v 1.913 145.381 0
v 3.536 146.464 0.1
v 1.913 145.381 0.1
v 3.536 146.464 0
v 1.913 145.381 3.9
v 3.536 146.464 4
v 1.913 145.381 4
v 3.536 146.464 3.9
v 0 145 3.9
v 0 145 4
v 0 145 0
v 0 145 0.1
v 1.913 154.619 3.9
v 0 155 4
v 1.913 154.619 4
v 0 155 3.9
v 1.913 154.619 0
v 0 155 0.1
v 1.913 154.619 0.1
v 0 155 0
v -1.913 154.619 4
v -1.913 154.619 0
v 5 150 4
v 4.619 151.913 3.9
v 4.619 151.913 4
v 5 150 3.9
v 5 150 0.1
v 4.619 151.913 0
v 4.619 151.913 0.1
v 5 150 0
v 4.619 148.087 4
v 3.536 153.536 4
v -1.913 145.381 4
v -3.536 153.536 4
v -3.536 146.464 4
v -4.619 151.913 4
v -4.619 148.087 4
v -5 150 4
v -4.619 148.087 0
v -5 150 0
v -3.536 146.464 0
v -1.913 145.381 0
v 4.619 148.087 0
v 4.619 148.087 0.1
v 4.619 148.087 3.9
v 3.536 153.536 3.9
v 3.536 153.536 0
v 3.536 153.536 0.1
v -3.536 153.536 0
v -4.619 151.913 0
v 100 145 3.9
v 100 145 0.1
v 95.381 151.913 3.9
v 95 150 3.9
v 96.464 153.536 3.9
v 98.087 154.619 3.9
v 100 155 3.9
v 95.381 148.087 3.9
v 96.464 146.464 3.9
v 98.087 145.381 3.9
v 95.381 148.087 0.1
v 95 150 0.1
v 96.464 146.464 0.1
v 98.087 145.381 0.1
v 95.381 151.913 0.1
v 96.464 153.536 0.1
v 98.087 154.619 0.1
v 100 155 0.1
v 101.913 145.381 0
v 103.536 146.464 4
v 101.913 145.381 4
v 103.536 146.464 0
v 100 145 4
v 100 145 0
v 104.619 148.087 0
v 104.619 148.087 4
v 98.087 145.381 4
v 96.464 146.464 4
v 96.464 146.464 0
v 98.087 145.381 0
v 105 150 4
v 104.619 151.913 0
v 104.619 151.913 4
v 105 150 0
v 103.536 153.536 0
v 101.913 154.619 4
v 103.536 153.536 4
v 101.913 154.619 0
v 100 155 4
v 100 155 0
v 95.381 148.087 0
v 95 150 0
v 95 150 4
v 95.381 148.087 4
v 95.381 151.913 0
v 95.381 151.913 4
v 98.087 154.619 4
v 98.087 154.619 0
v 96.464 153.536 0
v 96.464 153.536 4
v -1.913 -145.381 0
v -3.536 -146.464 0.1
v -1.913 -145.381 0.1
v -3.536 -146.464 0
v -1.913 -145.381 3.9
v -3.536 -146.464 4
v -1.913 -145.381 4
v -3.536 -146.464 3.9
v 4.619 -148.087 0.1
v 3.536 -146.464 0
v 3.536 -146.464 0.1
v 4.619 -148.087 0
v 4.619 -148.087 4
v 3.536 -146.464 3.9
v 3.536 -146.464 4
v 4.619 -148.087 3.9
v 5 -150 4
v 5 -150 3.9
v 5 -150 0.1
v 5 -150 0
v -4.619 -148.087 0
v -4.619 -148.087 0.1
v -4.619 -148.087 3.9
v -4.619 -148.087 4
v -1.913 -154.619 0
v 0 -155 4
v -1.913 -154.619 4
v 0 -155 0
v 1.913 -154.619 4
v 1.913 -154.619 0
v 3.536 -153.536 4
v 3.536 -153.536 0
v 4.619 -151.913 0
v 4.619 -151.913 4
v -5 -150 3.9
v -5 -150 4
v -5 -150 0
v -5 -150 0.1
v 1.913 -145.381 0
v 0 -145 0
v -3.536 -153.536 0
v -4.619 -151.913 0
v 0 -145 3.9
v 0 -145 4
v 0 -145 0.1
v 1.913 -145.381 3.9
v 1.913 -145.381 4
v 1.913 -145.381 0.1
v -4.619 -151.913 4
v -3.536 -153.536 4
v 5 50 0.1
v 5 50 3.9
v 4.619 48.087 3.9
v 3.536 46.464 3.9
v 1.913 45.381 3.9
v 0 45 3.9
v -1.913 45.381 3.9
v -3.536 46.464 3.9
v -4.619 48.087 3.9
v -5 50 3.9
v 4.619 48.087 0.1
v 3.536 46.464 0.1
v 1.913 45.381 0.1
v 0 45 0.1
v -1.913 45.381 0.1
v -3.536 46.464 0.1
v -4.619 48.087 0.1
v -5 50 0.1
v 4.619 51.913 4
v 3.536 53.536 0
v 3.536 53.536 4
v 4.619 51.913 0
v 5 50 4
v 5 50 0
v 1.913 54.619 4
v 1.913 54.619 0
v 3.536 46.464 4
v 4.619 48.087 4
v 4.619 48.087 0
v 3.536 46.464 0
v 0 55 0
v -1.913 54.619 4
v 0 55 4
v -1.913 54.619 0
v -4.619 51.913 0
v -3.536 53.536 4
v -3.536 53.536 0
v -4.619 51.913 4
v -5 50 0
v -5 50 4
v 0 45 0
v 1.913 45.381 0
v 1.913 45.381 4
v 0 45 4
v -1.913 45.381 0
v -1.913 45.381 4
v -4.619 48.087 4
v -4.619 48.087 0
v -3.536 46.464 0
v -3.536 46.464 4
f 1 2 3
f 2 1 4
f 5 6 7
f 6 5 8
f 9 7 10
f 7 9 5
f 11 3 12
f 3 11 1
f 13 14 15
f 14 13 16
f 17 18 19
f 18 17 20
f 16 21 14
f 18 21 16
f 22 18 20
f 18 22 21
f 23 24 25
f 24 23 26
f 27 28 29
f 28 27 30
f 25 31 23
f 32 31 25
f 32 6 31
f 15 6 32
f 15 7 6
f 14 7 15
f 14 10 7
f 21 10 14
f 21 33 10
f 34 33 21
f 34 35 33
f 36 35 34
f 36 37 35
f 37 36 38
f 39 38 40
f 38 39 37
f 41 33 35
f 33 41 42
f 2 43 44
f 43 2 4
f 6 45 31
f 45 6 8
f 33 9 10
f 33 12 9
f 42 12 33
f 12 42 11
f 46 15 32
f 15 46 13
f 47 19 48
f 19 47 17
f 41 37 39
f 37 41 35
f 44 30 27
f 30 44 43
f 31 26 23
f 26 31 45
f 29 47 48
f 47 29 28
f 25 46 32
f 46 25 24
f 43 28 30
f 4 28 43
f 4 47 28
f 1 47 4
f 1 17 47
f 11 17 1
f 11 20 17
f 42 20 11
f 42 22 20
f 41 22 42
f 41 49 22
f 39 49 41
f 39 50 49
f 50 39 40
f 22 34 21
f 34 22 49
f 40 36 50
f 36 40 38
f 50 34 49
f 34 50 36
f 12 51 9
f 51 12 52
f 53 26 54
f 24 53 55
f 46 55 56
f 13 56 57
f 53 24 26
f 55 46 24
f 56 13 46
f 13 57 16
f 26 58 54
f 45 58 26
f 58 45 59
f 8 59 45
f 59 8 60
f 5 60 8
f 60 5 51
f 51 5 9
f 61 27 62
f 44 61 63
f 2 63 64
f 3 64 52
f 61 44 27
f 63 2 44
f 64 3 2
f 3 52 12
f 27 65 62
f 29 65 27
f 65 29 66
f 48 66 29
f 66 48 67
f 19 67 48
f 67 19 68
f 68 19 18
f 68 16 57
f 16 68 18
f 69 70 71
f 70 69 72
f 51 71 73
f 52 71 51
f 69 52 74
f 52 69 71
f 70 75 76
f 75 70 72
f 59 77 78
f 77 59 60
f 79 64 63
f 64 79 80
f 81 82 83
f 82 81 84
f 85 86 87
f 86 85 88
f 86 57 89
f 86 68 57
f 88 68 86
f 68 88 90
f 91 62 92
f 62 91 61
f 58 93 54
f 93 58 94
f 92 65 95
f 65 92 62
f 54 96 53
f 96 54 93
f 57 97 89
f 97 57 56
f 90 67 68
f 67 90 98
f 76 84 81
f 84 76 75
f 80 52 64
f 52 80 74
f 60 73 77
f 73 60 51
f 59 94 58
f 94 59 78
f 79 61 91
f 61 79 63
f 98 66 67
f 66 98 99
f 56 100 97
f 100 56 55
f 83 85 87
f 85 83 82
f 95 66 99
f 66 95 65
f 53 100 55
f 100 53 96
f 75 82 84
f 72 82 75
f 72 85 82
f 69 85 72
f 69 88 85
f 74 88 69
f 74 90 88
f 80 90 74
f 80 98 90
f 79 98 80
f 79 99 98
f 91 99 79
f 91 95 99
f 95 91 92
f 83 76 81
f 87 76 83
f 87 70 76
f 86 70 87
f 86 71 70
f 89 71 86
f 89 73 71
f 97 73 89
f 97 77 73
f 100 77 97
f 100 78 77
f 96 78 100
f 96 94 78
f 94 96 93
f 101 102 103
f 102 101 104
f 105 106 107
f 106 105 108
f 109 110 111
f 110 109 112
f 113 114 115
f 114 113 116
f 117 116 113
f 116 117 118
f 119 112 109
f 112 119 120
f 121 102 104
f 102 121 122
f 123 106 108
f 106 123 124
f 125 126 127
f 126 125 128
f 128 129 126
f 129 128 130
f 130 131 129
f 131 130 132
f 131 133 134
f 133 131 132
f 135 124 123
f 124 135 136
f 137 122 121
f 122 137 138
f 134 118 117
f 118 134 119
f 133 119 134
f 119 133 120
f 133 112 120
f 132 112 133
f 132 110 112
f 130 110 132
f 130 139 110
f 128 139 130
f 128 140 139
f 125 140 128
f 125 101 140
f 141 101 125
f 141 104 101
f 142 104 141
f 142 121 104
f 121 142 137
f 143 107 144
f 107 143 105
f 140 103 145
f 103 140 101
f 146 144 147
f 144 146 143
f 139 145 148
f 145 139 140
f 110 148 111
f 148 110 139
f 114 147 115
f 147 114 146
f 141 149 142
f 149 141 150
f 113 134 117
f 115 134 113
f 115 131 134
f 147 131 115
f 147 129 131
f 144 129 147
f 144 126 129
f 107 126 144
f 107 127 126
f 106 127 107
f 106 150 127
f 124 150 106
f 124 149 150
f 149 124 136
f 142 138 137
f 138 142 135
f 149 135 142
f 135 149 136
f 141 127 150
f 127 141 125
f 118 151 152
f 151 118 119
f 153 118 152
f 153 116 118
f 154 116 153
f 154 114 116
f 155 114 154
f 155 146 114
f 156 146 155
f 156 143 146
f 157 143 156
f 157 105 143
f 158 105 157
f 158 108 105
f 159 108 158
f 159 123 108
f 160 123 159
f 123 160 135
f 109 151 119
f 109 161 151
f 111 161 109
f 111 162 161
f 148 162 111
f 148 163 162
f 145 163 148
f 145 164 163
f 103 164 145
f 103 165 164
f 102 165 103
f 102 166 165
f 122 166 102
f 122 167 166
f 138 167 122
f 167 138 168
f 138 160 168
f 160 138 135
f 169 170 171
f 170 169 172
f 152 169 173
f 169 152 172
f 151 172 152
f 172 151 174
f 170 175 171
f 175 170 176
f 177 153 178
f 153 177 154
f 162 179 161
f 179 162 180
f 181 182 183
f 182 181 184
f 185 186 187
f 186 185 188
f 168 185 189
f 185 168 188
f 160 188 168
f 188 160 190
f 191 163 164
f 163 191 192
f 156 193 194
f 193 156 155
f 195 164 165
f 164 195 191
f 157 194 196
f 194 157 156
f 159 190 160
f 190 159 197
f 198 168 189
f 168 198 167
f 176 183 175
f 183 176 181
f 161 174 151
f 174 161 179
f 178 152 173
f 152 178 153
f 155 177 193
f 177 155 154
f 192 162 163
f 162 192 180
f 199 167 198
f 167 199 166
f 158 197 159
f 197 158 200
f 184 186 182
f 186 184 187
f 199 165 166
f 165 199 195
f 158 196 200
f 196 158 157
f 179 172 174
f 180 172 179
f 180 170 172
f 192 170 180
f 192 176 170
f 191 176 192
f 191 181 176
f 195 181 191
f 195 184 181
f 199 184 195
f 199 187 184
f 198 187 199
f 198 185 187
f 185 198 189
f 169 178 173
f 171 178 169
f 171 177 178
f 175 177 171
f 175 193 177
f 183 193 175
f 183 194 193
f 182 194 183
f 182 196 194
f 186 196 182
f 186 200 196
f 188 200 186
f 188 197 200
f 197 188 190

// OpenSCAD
//common Vals
baseline = 300; //distance between static points of inputCrank and outputCrank
commonWidth = 10;
commonHeight = 4;

//inputCrank Vals
inputCrankLength = 100;
inputCrankAngle = 90;

//OutputCrank Vals
outputCrankLength = 200;

//ConnectingRod Vals


inputCrank(inputCrankLength, commonWidth, commonHeight, -inputCrankAngle);
outputCrank(outputCrankLength, commonWidth, commonHeight);  
connectingRod(baseline);
 
 
 
 module inputCrank(Length,Width,Height,initAngle){
	translate([0,baseline/2,0]){
		rotate([0,0,initAngle]){
			color("red")cylinder(Height,r = Width/2);
			translate([-Width/2,0,.1])
			cube([Width,Length,Height-.2]);
			translate([0,Length,0])
			color("green")cylinder(Height,r = Width/2);
		}
	}
 }
 
module outputCrank(Length,Width,Height){
	translate([0,-baseline/2,0]){
		rotate([0,0,0]){
		rod(Length,Width,Height);
		}
	} 
 }
 
 module connectingRod(Length,Width,Height){
 
 }
 
module rod(Length,Width,Height){		
		color("red")cylinder(Height,r = Width/2);
		translate([-Width/2,0,.1])
		cube([Width,Length,Height-.2]);
		translate([0,Length,0])
		color("green")cylinder(Height,r = Width/2);

}
